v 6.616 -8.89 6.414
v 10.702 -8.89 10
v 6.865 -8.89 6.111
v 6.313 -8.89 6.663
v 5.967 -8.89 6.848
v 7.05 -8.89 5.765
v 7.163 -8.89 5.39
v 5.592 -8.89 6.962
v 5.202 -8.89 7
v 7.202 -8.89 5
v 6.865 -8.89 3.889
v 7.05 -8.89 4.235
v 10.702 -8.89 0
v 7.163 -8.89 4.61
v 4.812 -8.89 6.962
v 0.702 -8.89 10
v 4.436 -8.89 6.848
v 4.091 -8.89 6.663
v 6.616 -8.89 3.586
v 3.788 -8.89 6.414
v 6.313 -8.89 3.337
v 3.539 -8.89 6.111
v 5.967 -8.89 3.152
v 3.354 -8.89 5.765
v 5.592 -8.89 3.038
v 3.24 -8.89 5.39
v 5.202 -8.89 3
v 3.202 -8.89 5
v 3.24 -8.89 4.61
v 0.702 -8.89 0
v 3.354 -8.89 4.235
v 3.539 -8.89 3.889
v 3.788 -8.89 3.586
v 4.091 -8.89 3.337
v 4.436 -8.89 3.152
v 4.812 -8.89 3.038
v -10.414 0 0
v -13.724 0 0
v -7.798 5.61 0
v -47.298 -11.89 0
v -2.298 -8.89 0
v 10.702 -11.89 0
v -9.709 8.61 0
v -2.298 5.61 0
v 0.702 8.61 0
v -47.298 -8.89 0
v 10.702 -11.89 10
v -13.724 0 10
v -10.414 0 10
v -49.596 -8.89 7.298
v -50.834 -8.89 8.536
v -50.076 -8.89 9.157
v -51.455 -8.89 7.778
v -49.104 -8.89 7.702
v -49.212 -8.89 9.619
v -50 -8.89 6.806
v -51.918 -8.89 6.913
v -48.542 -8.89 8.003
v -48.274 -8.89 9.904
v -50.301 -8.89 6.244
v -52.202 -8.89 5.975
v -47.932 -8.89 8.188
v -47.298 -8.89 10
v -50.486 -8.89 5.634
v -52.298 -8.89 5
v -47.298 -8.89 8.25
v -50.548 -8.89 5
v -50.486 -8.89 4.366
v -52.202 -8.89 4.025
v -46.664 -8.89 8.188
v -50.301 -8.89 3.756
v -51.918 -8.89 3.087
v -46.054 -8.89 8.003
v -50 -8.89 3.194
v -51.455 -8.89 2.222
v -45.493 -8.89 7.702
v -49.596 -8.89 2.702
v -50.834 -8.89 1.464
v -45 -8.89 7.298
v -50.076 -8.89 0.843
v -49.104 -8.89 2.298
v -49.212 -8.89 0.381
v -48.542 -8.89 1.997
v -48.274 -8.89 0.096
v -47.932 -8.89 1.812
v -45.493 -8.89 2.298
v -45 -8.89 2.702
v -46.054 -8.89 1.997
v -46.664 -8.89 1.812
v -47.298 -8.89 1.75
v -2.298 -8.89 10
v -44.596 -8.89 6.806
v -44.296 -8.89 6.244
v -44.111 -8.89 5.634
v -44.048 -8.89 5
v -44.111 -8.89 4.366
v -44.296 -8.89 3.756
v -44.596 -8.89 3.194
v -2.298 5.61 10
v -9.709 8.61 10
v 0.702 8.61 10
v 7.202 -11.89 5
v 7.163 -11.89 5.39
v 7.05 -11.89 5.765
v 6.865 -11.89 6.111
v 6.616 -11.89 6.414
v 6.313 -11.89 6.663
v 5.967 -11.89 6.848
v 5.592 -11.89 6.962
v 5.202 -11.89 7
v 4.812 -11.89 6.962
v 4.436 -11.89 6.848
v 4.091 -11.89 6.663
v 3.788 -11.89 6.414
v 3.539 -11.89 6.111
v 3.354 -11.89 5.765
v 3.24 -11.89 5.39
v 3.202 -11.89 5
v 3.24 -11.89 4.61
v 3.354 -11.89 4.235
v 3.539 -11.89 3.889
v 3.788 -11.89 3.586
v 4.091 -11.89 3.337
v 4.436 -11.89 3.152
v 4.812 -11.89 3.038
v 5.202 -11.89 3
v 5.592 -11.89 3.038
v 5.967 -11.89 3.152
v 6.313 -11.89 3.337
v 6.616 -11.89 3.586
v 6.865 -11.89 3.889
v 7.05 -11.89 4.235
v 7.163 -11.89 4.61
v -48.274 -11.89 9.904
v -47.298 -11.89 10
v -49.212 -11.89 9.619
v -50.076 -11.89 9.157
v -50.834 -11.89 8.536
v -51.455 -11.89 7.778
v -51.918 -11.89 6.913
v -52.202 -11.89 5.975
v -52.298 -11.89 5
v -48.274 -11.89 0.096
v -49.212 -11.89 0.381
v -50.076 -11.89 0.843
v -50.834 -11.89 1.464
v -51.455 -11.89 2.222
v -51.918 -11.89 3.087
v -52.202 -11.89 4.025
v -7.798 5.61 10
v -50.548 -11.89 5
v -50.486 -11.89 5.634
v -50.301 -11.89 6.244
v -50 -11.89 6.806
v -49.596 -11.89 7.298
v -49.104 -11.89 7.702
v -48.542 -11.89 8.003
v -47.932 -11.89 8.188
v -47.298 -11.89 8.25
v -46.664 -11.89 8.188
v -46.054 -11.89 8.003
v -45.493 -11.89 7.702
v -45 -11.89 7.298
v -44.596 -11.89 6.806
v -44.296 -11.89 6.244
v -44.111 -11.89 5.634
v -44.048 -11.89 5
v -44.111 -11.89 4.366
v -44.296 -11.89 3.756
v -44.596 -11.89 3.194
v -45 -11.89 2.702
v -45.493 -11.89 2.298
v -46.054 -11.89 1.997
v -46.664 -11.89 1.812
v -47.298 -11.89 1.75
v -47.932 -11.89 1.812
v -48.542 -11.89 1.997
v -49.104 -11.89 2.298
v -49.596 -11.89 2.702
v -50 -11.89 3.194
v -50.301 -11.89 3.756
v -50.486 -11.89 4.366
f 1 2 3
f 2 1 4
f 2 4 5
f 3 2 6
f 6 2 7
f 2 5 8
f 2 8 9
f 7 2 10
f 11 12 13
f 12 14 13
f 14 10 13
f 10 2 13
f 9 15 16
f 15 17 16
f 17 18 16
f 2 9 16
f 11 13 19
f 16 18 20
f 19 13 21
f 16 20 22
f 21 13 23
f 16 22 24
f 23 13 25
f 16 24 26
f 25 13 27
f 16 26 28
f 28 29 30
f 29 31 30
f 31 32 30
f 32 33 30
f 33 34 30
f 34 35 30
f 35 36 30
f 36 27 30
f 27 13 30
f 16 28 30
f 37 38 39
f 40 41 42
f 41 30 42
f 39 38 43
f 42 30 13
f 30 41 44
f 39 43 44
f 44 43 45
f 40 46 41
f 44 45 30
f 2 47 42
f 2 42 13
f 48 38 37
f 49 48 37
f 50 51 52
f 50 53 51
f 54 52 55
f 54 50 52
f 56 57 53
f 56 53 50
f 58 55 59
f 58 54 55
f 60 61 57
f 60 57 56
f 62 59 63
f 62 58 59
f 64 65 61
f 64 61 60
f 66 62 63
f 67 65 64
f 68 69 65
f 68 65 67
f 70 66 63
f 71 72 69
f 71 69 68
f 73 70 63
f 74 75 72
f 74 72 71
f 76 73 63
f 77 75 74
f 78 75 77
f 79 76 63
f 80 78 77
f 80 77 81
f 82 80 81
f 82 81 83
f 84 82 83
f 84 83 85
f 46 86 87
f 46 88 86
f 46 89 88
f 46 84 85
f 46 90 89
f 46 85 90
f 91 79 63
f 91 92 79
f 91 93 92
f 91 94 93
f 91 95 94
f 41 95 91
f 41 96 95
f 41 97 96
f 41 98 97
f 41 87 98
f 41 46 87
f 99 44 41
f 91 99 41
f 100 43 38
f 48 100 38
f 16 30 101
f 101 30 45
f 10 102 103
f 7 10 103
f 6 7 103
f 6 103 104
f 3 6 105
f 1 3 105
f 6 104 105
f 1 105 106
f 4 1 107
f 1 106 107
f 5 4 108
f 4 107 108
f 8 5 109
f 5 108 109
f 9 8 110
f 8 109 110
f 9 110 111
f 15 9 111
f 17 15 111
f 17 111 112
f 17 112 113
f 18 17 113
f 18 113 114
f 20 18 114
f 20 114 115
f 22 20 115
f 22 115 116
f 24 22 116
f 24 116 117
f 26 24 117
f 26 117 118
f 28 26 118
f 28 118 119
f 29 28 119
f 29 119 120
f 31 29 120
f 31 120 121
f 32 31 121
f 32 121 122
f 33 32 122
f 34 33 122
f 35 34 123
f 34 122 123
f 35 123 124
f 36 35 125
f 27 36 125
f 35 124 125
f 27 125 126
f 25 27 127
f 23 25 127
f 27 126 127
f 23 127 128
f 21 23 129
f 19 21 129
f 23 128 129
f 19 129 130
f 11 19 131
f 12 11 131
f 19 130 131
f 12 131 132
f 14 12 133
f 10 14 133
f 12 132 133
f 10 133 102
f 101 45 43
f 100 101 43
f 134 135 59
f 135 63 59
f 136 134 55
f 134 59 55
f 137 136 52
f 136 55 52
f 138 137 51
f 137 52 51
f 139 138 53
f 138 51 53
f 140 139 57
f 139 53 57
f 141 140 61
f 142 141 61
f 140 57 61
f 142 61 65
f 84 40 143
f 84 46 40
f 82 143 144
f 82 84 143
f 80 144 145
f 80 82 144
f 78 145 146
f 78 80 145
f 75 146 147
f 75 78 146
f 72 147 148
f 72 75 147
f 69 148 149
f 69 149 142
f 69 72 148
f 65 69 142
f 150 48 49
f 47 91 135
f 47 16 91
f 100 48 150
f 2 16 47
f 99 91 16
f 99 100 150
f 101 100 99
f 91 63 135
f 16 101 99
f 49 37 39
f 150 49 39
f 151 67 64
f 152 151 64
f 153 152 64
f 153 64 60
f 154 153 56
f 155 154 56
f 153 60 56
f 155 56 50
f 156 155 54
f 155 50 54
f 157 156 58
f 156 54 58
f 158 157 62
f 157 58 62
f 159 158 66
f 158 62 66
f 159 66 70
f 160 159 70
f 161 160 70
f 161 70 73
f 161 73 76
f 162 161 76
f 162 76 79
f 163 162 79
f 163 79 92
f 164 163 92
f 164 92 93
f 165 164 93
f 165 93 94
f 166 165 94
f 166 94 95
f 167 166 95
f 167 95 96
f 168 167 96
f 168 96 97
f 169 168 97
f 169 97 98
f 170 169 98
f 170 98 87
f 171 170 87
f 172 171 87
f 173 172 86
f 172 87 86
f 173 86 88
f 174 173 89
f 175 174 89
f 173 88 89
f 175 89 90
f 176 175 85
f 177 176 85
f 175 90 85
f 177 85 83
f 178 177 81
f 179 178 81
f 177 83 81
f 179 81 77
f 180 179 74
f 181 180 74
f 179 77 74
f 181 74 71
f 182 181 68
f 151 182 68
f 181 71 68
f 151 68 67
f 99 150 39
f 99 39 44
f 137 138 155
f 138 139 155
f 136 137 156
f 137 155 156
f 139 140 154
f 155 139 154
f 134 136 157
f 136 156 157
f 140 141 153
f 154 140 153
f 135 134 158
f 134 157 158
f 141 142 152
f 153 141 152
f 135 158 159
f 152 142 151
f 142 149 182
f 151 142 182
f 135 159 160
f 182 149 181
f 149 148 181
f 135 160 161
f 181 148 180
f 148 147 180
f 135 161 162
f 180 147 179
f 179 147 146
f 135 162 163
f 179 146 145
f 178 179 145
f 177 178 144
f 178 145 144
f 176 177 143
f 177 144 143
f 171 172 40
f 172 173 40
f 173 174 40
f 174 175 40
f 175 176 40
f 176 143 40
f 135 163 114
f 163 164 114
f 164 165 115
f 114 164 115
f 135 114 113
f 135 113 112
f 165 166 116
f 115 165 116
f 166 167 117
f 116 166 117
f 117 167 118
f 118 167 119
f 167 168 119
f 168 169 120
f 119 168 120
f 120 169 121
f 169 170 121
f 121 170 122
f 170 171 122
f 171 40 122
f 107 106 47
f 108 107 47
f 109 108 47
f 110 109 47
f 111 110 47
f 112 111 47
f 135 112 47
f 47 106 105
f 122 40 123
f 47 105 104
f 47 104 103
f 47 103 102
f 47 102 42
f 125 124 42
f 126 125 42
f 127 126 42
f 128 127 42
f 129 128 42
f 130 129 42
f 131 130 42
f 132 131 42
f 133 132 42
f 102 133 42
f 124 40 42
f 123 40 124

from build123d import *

# Parameters (mm, degrees)
F0_W     = 50
F0_H     = 3
F1_DEPTH = 10
F3_D     = 4
F5_R     = 4.99999
F6_D     = 6.5


# Not quite as in the source:
# - a fillet or chamfer is up to 0.001 mm smaller than in the source, because OpenCascade refuses the exact size


with BuildPart() as f1:
    # F0 (on Top) → F1 (new body)
    with BuildSketch(Plane.XY):
        Polygon((-2.2981421612, -11.8900760232), (10.7018578388, -11.8900760232), (10.7018578388, -8.8900760232), (0.7018578388, -8.8900760232), (0.7018578388, 8.6099239768), (-9.7093529436, 8.6099239768), (-13.7242264302, 0), (-10.4140926733, 0), (-7.7981421612, 5.6099239768), (-2.2981421612, 5.6099239768), (-2.2981421612, -8.8900760232), align=None)
        with Locations((-27.2981421612, -10.3900760232)):
            Rectangle(F0_W, F0_H)
    extrude(amount=F1_DEPTH)

    # F3 (through all)
    with Locations(Plane(origin=(0, -8.8900760232, 0), x_dir=(-1, 0, 0), z_dir=(0, 1, 0))):
        with Locations((-5.2018578388, 5)):
            Hole(F3_D / 2)

    # F5 (radius 5 in the source; OpenCascade refuses exactly that, so slightly less here)
    f5_edges = [f1.edges().sort_by_distance(p)[0] for p in [
        (-52.298142, -10.390076, 10),
        (-52.298142, -10.390076, 0),
    ]]
    fillet(f5_edges, radius=F5_R)

    # F6 (through all)
    with Locations(Plane.XZ.offset(11.8900760232)):
        with Locations((-47.2981421612, 5)):
            Hole(F6_D / 2)


solid = f1.part
